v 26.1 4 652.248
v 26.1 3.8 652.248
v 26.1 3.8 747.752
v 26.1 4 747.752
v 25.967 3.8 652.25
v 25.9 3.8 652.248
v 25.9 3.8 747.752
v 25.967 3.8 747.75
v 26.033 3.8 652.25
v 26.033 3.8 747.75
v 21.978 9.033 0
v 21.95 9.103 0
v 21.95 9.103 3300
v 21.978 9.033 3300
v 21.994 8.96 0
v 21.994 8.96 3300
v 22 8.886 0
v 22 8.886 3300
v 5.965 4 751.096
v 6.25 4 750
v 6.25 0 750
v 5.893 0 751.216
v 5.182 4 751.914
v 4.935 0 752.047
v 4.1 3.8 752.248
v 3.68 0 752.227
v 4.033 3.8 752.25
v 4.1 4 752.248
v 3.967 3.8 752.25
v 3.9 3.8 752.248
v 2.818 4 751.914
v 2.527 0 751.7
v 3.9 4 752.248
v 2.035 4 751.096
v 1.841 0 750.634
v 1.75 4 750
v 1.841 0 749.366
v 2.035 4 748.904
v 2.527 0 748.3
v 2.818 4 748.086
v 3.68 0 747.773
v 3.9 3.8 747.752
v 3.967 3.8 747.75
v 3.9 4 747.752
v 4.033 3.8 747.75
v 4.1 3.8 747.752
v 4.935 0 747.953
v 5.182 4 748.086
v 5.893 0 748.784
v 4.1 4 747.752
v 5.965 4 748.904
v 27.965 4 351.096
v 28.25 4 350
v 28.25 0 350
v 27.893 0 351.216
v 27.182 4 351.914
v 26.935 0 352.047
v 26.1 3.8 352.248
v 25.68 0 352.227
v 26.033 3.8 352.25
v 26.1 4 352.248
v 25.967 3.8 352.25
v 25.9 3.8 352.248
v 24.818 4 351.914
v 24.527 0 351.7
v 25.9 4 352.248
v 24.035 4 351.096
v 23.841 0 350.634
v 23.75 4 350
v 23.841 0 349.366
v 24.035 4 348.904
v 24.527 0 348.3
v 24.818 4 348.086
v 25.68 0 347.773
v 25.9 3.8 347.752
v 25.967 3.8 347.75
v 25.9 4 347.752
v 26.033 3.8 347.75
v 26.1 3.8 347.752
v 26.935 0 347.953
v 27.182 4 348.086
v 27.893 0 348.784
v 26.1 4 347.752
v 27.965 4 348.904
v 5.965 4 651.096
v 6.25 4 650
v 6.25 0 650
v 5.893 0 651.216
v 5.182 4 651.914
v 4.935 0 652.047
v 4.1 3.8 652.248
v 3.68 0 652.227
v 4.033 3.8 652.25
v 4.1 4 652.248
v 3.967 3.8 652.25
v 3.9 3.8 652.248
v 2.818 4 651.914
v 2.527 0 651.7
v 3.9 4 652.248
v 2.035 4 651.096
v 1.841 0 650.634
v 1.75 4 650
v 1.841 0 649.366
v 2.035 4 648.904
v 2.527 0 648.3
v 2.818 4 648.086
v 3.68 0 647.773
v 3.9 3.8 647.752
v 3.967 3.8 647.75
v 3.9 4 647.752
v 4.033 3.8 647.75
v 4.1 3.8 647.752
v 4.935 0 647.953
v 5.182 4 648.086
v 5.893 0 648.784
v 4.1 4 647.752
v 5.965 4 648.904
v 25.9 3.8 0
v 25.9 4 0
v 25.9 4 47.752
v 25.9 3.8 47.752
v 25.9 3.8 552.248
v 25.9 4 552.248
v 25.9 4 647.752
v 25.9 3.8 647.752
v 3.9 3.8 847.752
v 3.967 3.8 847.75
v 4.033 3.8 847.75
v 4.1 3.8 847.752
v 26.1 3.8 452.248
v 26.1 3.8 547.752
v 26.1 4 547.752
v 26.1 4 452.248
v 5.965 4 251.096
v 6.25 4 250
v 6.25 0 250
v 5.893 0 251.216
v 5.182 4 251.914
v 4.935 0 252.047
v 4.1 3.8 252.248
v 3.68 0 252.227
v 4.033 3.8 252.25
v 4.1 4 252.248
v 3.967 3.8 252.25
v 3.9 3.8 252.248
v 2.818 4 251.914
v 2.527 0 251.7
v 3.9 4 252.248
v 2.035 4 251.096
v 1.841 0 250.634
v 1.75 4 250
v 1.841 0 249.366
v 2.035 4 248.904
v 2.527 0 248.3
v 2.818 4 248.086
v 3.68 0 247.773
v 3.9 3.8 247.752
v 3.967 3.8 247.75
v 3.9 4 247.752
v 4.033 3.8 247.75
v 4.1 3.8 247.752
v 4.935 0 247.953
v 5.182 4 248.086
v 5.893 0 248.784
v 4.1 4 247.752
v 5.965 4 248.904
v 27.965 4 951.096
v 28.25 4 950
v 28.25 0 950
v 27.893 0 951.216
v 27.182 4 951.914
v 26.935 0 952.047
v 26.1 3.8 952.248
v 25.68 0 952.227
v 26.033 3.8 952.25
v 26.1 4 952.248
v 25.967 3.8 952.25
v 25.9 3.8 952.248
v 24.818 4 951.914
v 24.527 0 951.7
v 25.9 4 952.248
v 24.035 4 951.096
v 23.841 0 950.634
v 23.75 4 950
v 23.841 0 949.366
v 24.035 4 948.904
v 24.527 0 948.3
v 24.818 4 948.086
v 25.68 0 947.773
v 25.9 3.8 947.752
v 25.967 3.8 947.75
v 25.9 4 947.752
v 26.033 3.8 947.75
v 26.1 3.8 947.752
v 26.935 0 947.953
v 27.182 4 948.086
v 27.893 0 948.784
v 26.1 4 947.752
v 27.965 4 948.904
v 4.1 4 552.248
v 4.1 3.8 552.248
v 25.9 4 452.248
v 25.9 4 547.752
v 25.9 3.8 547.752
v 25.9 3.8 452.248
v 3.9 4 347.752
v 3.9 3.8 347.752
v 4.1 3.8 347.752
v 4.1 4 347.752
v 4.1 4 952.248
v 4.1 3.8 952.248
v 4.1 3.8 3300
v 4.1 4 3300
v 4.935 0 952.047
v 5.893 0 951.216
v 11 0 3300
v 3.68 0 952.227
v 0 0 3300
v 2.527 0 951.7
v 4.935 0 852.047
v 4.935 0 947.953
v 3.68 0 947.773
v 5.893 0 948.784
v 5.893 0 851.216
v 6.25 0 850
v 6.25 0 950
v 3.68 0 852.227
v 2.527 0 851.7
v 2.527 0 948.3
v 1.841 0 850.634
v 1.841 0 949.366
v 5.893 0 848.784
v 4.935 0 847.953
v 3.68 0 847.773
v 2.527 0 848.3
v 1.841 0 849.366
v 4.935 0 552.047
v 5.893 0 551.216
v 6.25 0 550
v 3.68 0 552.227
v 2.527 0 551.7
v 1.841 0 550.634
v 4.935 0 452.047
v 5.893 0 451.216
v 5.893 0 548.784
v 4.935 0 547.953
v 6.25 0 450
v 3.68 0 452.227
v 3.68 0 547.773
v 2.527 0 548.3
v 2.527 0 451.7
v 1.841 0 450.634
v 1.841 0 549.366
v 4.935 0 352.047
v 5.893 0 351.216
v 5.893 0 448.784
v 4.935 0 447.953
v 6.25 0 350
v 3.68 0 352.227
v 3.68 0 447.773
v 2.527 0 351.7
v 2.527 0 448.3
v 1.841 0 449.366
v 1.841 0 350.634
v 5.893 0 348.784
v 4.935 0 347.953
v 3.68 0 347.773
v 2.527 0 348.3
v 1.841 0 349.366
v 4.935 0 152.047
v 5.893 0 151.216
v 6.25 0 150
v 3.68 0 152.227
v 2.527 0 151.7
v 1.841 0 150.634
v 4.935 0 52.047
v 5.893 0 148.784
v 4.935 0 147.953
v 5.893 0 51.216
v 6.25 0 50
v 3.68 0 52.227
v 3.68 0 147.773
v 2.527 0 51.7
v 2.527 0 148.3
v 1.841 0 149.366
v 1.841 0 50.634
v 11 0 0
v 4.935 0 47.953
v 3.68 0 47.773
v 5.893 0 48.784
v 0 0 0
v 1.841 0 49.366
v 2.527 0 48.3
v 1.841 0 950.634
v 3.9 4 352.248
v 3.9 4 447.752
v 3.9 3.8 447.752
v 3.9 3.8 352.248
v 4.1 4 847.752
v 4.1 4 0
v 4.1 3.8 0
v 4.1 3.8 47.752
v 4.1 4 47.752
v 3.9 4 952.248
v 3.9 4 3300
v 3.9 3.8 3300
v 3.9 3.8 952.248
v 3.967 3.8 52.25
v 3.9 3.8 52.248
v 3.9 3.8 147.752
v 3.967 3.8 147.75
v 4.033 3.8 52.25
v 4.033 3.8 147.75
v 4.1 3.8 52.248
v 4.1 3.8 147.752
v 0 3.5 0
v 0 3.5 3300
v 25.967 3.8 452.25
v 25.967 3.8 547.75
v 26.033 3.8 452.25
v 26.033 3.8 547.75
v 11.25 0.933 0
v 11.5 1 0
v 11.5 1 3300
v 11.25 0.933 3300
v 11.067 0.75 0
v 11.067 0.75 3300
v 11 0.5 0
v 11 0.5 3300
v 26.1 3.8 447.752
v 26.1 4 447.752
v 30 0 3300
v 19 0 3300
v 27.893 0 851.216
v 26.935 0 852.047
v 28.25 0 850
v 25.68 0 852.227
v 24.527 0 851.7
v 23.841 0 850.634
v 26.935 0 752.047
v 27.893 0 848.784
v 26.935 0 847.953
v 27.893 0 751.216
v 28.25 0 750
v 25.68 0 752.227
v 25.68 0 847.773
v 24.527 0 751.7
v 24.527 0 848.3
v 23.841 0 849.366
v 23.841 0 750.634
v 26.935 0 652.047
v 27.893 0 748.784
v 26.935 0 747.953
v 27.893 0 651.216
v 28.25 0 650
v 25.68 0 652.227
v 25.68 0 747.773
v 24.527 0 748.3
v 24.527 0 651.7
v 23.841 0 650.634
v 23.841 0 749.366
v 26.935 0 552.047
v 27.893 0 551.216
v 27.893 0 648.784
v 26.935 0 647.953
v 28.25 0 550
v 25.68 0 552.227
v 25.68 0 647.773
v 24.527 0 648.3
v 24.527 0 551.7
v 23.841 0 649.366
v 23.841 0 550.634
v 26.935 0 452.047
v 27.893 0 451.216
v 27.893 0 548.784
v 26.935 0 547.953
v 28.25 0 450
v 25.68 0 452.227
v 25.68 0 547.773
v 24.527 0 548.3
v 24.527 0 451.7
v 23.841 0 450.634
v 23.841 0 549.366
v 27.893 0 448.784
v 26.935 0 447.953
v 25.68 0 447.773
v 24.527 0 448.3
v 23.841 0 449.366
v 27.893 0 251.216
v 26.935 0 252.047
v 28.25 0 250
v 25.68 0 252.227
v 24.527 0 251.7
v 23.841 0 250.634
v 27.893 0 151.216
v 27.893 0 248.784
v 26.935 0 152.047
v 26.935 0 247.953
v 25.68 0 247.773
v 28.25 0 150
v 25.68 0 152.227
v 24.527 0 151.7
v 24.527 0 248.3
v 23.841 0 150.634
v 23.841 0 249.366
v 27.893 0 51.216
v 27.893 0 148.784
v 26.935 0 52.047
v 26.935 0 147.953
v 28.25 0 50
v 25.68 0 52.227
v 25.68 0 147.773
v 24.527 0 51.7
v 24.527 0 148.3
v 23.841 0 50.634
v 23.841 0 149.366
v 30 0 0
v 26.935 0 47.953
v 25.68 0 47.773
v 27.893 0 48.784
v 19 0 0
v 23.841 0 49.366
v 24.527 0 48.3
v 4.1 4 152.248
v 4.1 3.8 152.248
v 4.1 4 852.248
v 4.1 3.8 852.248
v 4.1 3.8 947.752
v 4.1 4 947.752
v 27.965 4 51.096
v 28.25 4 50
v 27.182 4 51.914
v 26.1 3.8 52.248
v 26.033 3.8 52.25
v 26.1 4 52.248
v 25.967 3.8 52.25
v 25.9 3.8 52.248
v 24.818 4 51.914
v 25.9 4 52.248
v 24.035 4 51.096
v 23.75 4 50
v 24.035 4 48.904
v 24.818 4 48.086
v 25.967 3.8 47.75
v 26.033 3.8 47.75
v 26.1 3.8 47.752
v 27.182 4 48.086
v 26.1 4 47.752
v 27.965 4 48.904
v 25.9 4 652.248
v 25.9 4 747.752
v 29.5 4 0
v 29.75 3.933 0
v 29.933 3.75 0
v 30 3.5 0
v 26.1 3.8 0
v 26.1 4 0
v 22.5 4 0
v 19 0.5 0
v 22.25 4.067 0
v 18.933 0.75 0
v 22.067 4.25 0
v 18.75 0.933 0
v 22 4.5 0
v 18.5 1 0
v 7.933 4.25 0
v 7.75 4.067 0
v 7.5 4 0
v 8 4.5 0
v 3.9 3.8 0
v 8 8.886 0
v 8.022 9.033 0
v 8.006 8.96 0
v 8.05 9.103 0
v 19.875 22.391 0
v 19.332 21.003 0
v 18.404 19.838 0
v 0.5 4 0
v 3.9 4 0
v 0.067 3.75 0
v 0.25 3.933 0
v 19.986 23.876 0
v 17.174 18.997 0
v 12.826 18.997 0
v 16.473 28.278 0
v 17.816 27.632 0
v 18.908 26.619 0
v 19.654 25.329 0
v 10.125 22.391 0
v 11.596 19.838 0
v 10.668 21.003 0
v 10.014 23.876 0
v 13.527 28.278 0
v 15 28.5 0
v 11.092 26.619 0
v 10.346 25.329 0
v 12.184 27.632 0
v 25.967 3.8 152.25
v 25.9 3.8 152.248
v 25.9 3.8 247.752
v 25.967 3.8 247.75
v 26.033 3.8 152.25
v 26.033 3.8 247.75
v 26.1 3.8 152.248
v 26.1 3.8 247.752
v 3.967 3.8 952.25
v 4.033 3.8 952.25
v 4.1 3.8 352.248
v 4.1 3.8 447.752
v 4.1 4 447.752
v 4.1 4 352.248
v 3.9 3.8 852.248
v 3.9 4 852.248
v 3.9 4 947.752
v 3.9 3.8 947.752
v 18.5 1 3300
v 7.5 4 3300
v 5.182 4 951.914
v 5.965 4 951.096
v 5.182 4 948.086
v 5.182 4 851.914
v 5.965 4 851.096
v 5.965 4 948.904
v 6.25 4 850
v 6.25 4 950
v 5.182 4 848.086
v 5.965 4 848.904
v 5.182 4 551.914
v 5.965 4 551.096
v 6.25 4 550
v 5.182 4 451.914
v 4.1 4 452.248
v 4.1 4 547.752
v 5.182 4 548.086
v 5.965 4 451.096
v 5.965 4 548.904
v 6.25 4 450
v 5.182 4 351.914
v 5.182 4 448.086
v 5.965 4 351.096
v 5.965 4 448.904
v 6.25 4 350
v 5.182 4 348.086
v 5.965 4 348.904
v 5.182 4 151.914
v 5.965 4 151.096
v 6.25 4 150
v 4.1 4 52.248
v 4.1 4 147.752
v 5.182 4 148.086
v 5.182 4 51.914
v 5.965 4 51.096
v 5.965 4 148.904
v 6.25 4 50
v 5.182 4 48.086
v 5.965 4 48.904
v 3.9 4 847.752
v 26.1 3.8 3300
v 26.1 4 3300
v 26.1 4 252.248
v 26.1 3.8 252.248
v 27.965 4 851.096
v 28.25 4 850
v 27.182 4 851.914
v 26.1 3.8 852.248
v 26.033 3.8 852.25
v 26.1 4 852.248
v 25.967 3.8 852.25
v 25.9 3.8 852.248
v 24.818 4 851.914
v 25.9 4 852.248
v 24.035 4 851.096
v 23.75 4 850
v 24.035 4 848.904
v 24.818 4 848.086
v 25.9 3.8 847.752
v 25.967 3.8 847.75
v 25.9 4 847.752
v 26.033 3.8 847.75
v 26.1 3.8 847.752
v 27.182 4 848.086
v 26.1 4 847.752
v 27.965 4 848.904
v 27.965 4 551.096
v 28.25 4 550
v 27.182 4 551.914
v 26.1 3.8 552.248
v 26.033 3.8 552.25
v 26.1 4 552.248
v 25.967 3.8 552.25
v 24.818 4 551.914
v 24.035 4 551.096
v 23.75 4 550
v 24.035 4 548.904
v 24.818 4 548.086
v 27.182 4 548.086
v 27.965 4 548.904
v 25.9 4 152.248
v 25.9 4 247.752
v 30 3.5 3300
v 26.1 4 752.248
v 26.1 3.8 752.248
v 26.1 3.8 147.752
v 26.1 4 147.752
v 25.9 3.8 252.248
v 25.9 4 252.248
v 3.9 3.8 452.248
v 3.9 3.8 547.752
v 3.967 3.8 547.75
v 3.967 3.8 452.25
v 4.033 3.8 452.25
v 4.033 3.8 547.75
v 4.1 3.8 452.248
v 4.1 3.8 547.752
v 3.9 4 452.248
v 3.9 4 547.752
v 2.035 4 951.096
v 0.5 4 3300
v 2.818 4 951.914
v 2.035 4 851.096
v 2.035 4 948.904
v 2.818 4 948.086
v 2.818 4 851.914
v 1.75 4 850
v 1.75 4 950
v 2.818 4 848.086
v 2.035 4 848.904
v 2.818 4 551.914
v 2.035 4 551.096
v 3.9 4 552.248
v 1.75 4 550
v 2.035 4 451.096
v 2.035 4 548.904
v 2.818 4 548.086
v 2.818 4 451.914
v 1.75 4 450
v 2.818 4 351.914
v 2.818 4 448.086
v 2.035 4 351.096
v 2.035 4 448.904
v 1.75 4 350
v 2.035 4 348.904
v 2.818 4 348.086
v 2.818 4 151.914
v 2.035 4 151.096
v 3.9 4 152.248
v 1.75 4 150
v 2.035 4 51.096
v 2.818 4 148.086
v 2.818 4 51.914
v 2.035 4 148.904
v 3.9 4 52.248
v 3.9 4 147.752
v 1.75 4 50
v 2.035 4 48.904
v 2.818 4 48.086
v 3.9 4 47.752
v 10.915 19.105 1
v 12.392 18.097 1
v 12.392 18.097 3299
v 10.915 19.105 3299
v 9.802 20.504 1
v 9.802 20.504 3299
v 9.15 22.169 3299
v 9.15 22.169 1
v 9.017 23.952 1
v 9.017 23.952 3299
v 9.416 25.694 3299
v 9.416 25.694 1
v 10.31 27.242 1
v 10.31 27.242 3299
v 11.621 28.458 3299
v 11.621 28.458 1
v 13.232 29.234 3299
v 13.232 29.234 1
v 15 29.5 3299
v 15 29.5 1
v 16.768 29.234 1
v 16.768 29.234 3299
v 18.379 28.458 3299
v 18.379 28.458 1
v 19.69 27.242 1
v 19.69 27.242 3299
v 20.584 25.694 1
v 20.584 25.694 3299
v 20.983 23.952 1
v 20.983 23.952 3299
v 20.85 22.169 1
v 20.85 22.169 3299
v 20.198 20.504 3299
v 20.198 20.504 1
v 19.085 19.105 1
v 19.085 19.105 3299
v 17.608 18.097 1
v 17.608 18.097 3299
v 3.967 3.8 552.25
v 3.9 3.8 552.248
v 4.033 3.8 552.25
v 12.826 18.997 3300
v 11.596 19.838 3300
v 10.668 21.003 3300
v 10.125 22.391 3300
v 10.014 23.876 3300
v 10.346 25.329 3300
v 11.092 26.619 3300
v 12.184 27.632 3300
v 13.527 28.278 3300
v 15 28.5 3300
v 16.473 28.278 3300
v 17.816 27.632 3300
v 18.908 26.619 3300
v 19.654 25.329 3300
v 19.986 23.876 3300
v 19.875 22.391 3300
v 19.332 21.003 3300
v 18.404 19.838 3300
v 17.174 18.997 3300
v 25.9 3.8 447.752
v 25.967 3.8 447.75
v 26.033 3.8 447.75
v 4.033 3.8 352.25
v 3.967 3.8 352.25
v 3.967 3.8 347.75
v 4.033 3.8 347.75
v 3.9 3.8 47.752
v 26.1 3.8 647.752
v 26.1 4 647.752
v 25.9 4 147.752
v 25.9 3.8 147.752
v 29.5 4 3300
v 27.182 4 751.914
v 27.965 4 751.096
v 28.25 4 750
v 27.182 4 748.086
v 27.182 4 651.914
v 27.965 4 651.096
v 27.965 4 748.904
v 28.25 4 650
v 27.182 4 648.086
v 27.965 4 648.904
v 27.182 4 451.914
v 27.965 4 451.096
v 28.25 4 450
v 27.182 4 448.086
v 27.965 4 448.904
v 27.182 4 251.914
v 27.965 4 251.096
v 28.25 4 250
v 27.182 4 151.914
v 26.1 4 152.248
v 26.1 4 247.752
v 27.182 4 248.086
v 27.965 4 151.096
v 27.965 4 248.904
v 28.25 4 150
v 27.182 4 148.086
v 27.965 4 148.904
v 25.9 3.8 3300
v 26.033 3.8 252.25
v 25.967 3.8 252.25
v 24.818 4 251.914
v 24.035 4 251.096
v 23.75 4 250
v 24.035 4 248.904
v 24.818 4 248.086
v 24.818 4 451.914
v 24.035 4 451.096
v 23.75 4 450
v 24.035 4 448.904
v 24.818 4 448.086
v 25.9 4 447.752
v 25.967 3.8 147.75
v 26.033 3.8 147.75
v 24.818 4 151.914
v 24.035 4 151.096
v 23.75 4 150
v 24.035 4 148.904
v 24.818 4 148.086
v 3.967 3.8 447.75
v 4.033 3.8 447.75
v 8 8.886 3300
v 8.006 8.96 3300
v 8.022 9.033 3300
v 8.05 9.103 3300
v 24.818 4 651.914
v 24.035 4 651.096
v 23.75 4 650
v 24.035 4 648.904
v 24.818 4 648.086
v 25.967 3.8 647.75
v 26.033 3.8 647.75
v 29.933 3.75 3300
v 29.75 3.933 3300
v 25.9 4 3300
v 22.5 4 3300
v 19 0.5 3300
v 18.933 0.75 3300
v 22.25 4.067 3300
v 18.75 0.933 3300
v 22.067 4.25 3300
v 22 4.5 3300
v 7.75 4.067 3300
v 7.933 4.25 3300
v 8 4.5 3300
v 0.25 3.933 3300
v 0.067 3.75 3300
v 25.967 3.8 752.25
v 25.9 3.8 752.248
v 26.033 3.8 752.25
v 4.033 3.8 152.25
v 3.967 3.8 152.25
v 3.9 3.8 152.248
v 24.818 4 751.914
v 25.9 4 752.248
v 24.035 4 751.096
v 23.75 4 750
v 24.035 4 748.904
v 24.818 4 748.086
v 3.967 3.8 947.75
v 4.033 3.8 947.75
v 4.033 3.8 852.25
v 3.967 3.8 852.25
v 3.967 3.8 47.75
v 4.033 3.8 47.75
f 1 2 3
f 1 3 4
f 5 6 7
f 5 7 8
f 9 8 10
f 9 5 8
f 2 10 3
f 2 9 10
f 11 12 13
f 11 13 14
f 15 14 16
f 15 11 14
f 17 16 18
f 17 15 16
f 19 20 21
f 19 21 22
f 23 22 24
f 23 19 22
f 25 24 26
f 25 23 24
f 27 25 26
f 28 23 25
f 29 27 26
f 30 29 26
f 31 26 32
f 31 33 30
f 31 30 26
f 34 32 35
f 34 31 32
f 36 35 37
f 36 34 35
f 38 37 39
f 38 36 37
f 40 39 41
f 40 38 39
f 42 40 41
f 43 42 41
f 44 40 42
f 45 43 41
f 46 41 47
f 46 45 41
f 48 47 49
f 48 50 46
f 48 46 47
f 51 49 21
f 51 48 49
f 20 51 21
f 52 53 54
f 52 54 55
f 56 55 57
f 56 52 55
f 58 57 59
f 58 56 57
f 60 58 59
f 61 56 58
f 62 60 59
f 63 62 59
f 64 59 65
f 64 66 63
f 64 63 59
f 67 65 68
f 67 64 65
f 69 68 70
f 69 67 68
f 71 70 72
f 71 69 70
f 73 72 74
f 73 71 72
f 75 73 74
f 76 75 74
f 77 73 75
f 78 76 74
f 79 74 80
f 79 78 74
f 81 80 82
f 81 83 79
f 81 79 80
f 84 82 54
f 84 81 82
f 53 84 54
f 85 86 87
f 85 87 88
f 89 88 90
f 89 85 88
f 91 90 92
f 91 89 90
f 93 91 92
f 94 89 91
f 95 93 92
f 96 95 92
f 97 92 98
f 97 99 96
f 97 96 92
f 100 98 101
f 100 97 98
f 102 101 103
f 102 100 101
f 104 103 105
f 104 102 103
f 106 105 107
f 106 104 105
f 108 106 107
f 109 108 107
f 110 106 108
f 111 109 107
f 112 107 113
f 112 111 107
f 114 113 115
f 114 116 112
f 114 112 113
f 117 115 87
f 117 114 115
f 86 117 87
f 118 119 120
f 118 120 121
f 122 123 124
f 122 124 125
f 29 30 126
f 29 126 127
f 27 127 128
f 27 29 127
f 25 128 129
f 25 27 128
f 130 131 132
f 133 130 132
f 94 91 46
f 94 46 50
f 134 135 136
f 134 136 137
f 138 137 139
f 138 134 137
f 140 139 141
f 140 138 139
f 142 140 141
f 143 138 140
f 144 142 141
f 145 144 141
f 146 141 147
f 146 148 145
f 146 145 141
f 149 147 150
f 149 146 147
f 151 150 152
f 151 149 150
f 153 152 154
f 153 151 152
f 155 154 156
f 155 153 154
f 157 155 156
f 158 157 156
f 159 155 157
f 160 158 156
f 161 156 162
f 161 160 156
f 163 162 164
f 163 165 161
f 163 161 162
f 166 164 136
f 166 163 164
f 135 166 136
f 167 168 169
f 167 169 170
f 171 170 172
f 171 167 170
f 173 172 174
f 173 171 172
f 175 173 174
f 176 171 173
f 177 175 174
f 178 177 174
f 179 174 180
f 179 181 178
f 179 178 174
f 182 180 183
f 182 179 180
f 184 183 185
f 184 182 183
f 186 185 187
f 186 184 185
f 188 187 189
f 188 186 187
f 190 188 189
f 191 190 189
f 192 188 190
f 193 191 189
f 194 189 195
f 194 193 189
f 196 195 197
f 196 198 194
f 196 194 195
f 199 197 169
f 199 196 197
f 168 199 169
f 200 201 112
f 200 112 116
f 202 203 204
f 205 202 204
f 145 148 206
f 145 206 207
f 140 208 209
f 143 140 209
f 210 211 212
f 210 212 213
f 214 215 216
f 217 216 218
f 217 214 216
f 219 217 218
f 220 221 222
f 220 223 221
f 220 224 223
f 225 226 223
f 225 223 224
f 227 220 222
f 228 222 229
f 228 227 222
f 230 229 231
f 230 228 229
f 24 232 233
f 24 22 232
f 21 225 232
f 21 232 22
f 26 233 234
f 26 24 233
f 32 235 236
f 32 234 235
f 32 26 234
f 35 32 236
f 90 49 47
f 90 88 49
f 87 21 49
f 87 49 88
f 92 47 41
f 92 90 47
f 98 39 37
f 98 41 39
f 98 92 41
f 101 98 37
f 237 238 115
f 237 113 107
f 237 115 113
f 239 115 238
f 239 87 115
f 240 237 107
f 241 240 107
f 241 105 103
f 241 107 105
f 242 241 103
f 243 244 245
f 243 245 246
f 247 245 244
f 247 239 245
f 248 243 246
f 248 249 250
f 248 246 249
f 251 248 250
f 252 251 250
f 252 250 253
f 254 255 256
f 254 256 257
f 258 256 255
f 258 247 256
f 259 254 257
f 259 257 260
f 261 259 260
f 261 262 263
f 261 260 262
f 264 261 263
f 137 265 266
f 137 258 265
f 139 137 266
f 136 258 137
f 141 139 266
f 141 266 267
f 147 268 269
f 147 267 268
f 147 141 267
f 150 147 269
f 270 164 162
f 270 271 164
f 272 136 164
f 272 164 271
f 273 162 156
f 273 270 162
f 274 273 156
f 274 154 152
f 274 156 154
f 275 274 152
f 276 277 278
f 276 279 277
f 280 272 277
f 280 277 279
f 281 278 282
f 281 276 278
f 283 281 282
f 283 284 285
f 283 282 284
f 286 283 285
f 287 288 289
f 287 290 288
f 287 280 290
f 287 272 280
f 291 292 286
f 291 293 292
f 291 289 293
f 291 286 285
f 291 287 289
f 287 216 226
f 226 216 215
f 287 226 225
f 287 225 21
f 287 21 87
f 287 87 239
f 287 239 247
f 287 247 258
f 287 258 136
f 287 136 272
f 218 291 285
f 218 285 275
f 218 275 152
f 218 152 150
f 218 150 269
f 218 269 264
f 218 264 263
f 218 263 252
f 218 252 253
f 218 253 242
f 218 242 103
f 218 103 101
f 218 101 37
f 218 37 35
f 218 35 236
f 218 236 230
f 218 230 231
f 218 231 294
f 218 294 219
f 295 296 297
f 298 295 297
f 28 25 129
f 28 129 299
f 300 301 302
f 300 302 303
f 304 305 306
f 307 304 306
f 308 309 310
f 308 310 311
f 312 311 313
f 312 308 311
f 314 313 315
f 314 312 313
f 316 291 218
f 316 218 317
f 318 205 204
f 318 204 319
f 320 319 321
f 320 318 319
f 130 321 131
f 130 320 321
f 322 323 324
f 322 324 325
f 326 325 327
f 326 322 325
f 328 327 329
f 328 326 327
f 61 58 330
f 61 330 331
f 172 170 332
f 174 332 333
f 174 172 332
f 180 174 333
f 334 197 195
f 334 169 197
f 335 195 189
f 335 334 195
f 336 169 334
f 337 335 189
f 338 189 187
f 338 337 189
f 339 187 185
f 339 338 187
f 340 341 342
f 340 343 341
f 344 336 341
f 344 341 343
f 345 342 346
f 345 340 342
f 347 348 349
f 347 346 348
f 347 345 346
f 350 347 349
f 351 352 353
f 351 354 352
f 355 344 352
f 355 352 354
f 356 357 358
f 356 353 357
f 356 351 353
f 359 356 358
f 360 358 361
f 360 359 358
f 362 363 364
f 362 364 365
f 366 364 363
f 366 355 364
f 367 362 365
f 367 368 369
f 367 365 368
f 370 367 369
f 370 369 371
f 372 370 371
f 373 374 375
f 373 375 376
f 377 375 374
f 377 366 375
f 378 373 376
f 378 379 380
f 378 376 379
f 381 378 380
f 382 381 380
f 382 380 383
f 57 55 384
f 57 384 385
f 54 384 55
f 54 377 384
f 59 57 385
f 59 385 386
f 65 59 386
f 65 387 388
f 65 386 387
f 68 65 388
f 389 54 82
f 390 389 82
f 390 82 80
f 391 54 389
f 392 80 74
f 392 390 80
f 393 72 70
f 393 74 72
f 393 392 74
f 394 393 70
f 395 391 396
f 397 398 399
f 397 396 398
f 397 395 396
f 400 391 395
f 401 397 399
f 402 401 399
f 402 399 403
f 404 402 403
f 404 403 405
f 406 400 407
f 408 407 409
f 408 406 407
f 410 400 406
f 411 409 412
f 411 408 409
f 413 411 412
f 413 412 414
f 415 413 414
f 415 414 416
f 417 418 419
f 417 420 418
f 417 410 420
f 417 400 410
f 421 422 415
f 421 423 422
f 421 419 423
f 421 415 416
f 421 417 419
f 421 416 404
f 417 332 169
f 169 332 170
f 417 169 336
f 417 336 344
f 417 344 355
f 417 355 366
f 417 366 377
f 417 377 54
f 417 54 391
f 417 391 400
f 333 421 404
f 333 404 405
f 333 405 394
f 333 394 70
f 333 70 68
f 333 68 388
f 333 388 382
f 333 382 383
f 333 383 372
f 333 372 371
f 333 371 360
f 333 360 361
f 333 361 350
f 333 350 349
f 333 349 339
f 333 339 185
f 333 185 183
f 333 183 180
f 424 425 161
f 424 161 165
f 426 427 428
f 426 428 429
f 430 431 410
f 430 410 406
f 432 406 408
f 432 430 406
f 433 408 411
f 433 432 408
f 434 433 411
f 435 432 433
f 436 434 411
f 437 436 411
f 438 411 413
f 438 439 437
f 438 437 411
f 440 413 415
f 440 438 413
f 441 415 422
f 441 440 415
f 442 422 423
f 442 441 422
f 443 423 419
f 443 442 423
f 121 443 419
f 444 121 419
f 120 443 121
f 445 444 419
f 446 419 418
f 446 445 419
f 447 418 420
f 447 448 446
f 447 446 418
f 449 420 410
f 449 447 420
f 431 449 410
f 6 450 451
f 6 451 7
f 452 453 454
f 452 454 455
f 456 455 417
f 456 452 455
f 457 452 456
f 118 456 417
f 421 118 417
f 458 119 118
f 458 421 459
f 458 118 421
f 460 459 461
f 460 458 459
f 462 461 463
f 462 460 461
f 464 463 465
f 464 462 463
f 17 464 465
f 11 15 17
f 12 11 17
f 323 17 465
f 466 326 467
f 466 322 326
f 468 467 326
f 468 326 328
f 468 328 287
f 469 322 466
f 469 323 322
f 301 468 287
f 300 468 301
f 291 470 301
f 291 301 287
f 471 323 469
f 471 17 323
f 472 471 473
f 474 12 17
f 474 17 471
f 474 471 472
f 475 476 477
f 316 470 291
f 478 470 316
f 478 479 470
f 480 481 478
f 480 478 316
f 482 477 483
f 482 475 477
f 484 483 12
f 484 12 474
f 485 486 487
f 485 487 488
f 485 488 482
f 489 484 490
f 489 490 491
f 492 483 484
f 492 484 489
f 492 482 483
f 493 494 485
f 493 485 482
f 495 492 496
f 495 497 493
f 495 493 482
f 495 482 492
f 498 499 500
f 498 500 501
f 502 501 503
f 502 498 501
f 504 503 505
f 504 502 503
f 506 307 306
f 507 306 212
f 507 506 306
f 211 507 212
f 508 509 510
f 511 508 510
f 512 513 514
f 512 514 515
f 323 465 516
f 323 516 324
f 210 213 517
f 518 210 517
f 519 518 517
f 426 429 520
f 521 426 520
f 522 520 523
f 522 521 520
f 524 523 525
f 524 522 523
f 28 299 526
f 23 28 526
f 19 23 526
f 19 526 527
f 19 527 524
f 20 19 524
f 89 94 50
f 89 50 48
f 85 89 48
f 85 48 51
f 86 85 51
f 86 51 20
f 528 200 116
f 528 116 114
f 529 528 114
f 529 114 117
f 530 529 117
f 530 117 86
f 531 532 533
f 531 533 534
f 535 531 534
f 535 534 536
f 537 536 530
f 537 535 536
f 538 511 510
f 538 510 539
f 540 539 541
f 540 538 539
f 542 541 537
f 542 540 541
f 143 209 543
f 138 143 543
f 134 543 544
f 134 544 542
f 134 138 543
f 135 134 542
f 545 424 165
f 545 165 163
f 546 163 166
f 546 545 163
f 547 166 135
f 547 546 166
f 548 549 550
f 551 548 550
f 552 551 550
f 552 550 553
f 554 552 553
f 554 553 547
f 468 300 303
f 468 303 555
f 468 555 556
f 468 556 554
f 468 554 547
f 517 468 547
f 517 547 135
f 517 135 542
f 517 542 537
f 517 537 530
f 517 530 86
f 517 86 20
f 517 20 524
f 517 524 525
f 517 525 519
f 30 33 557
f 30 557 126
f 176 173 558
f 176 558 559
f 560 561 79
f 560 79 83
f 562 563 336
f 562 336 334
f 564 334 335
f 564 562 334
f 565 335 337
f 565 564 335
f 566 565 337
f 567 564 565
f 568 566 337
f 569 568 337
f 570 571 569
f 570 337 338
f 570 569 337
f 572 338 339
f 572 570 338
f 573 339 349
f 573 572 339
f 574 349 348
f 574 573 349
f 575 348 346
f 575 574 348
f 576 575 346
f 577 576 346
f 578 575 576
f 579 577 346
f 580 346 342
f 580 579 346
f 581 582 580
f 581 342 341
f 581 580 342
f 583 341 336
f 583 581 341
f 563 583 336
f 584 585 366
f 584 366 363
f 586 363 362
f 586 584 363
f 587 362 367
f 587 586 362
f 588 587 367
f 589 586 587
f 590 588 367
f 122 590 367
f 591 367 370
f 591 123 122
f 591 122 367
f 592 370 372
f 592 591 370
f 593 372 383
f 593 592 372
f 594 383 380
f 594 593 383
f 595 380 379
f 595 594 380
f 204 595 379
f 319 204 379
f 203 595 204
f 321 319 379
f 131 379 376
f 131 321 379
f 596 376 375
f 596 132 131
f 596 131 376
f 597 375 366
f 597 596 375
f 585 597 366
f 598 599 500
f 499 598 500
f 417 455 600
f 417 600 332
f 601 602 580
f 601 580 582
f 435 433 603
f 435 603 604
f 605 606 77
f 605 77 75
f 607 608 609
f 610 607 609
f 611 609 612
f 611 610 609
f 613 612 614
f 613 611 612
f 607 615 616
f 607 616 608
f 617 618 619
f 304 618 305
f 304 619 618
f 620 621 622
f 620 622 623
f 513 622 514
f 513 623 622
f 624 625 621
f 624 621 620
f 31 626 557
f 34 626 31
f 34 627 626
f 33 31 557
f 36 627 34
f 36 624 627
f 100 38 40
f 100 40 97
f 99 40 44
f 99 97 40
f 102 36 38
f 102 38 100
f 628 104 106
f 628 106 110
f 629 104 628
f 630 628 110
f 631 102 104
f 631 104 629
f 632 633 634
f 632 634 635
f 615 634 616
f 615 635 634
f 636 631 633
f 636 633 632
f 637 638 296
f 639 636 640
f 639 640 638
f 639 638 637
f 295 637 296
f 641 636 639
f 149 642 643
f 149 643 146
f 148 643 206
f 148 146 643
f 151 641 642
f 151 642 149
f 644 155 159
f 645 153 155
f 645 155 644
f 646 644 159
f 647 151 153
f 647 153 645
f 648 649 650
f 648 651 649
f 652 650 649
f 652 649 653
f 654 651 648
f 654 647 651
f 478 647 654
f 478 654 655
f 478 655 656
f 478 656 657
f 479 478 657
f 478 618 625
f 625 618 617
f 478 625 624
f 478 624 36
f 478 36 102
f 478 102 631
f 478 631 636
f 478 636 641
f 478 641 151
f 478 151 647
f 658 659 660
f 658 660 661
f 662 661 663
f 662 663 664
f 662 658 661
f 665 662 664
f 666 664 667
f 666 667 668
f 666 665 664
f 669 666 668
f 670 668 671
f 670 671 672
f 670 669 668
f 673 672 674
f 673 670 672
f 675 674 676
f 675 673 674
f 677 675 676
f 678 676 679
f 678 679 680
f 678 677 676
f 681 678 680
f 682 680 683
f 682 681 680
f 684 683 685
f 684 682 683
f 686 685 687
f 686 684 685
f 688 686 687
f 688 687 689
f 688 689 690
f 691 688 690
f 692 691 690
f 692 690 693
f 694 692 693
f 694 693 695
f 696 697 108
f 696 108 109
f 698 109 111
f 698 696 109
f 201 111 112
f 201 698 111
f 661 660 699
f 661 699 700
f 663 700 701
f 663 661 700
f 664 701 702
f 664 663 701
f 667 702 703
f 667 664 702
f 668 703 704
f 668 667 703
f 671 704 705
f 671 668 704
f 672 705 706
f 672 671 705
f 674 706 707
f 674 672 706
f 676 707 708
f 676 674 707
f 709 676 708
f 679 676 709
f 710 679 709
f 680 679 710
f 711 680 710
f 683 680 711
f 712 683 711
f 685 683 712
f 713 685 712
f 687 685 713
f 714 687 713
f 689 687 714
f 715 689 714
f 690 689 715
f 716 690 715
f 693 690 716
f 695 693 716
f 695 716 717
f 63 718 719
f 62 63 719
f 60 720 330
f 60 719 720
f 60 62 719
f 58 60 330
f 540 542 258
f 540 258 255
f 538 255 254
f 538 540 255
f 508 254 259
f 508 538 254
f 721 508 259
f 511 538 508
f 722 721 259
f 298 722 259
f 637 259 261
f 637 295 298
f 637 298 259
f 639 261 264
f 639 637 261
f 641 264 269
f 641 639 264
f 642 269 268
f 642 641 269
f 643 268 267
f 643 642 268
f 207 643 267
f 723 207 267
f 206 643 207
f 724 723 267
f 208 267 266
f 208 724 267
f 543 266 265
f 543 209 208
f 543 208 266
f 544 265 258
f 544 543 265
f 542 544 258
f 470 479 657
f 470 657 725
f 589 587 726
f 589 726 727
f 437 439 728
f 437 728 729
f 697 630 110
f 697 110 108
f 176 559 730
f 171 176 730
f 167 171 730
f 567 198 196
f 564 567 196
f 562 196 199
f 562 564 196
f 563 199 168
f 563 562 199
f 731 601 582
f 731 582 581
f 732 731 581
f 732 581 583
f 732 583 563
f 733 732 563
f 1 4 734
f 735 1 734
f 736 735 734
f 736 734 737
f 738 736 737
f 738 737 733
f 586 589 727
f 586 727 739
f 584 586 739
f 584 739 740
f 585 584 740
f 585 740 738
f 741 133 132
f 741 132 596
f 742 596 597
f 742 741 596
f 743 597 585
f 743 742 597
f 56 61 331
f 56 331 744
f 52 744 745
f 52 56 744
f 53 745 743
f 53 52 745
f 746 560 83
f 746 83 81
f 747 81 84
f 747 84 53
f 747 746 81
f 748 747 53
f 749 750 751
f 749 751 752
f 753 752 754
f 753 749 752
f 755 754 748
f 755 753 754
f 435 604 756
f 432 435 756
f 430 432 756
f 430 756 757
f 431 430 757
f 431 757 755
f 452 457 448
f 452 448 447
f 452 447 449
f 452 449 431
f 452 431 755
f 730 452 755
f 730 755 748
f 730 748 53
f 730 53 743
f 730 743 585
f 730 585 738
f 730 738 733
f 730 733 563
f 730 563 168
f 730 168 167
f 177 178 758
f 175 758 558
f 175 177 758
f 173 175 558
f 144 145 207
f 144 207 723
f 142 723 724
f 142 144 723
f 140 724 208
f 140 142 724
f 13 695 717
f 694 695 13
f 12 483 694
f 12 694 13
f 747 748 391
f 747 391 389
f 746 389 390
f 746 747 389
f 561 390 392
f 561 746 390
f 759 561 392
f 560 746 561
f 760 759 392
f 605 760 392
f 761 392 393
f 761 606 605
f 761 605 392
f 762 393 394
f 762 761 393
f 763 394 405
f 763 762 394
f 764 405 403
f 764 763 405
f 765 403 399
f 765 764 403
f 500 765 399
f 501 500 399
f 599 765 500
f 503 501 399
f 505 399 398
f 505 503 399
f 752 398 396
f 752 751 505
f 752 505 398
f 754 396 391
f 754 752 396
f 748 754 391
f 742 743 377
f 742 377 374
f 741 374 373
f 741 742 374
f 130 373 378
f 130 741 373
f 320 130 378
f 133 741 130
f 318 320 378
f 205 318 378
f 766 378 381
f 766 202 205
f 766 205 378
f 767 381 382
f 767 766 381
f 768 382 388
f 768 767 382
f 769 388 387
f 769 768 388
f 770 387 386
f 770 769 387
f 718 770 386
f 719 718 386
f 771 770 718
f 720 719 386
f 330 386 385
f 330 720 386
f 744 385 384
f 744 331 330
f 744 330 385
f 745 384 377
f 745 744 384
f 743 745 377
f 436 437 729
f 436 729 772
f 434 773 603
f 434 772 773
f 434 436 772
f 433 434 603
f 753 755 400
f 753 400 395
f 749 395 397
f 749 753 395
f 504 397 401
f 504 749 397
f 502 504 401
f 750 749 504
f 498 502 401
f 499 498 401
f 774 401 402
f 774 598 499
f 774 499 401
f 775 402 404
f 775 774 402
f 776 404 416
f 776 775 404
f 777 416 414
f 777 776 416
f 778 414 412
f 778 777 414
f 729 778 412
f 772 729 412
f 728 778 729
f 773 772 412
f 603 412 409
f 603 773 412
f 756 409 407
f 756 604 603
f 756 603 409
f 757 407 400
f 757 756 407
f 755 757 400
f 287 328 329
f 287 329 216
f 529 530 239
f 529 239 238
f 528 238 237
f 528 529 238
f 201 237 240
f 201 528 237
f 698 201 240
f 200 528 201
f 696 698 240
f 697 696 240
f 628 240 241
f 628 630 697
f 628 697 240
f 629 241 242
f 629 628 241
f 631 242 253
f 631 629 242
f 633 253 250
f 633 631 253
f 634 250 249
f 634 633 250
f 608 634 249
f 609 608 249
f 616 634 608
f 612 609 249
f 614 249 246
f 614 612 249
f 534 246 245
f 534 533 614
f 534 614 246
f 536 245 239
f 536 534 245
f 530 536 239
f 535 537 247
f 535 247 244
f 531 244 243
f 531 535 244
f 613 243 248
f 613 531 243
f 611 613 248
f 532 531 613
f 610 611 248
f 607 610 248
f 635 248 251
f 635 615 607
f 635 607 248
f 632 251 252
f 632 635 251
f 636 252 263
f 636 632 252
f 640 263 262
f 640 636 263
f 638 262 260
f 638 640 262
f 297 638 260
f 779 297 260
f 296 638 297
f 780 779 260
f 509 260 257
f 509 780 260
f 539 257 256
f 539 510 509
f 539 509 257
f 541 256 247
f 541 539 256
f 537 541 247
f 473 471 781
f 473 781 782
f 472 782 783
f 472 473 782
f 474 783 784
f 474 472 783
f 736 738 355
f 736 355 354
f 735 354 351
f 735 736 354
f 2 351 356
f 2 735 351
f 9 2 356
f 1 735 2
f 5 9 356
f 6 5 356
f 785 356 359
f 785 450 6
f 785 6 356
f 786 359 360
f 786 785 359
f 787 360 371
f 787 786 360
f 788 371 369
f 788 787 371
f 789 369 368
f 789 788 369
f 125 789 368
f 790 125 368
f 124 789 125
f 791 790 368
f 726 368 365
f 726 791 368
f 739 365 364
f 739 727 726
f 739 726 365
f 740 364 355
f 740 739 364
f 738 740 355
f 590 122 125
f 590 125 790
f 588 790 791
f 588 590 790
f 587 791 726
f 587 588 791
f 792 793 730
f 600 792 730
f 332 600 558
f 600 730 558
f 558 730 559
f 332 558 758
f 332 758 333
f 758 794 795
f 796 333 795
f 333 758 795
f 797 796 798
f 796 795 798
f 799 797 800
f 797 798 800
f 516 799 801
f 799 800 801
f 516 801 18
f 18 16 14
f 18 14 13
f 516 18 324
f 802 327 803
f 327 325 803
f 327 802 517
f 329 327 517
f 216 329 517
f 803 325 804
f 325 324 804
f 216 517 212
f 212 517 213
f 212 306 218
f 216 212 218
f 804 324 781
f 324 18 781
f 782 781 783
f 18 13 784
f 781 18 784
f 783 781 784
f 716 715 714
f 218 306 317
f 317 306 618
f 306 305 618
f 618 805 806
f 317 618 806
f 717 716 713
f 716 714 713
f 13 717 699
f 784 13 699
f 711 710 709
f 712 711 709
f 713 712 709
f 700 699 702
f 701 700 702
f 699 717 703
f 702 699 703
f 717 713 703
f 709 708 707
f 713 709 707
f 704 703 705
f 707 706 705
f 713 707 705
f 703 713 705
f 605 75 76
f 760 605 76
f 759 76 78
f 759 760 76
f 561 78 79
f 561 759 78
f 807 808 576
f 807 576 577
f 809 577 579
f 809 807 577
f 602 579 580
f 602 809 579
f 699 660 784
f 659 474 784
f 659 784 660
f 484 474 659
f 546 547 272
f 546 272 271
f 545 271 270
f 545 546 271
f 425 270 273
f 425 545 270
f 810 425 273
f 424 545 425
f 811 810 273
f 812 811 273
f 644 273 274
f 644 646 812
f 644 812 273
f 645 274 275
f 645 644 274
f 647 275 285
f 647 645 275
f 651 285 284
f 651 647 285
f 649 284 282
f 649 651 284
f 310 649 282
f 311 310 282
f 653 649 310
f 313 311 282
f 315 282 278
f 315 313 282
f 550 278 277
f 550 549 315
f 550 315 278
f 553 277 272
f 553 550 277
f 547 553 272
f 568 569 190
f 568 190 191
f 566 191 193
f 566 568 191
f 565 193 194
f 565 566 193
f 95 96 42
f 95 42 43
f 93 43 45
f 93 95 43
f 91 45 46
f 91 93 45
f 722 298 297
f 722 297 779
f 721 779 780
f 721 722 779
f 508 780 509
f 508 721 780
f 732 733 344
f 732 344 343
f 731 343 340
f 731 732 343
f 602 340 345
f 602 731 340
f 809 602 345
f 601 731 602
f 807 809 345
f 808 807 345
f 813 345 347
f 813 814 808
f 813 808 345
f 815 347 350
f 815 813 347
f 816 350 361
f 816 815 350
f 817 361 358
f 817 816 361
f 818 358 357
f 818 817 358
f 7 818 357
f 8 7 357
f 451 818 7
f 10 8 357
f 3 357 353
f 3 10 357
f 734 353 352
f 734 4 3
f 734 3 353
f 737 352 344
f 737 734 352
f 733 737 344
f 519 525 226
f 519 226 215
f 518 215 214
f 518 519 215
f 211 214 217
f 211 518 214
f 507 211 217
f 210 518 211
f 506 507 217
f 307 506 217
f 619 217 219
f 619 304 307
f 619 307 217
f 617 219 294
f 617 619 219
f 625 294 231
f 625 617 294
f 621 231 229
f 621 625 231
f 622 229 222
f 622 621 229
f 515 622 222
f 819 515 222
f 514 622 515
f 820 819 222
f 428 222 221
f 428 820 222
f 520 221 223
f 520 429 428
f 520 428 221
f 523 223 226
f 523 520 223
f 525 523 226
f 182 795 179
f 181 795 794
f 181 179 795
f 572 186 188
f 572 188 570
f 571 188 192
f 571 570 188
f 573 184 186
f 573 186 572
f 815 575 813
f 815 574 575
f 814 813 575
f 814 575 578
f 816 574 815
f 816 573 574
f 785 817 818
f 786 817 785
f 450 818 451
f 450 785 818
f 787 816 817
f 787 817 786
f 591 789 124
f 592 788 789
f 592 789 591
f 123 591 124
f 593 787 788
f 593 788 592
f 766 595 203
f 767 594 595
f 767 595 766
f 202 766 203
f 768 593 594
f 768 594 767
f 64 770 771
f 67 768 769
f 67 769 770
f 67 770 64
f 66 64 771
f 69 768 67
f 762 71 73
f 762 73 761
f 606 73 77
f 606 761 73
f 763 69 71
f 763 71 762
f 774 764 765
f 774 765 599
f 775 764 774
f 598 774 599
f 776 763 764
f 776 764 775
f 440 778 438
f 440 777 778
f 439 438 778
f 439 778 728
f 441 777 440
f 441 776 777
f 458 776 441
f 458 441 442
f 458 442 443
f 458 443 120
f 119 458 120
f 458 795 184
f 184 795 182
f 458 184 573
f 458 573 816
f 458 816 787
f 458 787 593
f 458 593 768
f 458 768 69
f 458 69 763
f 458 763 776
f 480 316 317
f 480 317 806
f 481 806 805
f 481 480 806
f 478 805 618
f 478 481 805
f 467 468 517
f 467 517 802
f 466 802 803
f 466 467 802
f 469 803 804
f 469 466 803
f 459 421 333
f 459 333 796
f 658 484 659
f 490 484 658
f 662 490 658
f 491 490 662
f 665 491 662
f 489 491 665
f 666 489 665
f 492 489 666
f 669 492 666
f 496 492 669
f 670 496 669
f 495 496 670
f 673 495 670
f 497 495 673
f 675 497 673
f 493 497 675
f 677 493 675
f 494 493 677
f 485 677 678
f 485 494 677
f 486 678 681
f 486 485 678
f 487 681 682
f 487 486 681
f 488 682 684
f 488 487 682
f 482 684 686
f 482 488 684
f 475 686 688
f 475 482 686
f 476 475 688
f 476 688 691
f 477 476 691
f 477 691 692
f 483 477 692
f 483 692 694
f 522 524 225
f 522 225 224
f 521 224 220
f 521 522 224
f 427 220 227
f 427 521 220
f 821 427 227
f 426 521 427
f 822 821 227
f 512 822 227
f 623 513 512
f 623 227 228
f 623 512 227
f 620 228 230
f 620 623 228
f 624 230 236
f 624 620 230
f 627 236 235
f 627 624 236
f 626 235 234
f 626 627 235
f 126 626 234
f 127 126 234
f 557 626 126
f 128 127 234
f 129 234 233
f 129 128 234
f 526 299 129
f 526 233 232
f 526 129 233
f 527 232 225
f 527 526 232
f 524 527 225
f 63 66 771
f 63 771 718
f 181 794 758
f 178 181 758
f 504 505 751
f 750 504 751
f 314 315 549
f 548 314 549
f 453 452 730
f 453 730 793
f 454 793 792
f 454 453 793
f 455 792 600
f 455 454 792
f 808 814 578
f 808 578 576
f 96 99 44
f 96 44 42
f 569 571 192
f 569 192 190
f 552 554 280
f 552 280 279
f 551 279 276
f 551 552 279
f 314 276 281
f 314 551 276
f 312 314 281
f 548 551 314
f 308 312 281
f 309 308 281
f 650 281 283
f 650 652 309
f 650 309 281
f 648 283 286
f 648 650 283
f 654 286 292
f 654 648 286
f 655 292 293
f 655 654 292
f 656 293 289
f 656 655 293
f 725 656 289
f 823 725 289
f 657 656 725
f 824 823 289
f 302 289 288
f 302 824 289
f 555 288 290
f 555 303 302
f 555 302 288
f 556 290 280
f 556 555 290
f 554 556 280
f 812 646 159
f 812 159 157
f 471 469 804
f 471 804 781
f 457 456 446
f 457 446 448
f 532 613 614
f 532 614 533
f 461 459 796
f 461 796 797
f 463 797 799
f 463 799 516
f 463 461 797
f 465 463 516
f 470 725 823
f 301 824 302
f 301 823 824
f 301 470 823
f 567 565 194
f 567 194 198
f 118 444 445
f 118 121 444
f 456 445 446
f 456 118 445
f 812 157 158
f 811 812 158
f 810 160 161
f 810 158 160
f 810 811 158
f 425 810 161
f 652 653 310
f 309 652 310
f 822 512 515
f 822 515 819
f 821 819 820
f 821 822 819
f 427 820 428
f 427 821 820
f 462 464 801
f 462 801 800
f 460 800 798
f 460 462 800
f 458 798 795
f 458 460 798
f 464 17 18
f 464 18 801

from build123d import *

# Parameters (mm, degrees)
BOSS_EXTRU_1_DEPTH         = 3300
CHANFREIN5_SIZE            = 1
CHANFREIN6_SIZE            = 1
ENL_V_START                = -4
ESQUISSE2_R                = 2.25
ENL_V_MAT_EXTRU_1_DEPTH    = 4
R_P_TITION_LIN_AIRE1_COUNT = 9
R_P_TITION_LIN_AIRE1_PITCH = 100


with BuildPart() as part:
    # Esquisse1 → Boss.-Extru.1 (new body)
    with BuildSketch(Plane.XY):
        with BuildLine():
            Line((0, 0), (0, 3.5))
            ThreePointArc((0, 3.5), (0.146446609, 3.853553391), (0.5, 4))
            Line((0.5, 4), (3.9, 4))
            Line((3.9, 4), (3.9, 3.8))
            Line((3.9, 3.8), (4.1, 3.8))
            Line((4.1, 3.8), (4.1, 4))
            Line((4.1, 4), (7.5, 4))
            ThreePointArc((7.5, 4), (7.853553391, 4.146446609), (8, 4.5))
            Line((8, 4.5), (8, 8.885625558))
            ThreePointArc((8, 8.885625558), (8.012589542, 8.997120156), (8.049724182, 9.103000091))
            Line((8.049724182, 9.103000091), (12.391505605, 18.096690182))
            ThreePointArc((12.391505605, 18.096690182), (15, 29.5), (17.608494395, 18.096690182))
            Line((17.608494395, 18.096690182), (21.950275818, 9.103000091))
            ThreePointArc((21.950275818, 9.103000091), (21.987410458, 8.997120156), (22, 8.885625558))
            Line((22, 8.885625558), (22, 4.5))
            ThreePointArc((22, 4.5), (22.146446609, 4.146446609), (22.5, 4))
            Line((22.5, 4), (25.9, 4))
            Line((25.9, 4), (25.9, 3.8))
            Line((25.9, 3.8), (26.1, 3.8))
            Line((26.1, 3.8), (26.1, 4))
            Line((26.1, 4), (29.5, 4))
            ThreePointArc((29.5, 4), (29.853553391, 3.853553391), (30, 3.5))
            Line((30, 3.5), (30, 0))
            Line((30, 0), (19, 0))
            Line((19, 0), (19, 0.5))
            ThreePointArc((19, 0.5), (18.853553391, 0.853553391), (18.5, 1))
            Line((18.5, 1), (11.5, 1))
            ThreePointArc((11.5, 1), (11.146446609, 0.853553391), (11, 0.5))
            Line((11, 0.5), (11, 0))
            Line((11, 0), (0, 0))
        make_face()
    extrude(amount=BOSS_EXTRU_1_DEPTH)

    # Chanfrein5
    chanfrein5_edges = [part.edges().sort_by_distance(p)[0] for p in [
        (15, 29.5, 0),
    ]]
    chamfer(chanfrein5_edges, length=CHANFREIN5_SIZE)

    # Chanfrein6
    chanfrein6_edges = [part.edges().sort_by_distance(p)[0] for p in [
        (15, 29.5, 3300),
    ]]
    chamfer(chanfrein6_edges, length=CHANFREIN6_SIZE)

    # Esquisse2 → Enlèv. mat.-Extru.1 (cut)
    with BuildSketch(Plane.XZ.offset(ENL_V_START)):
        with Locations((4, 850)):
            Circle(ESQUISSE2_R)
        with Locations((26, 850)):
            Circle(ESQUISSE2_R)
        with Locations((26, 950)):
            Circle(ESQUISSE2_R)
        with Locations((4, 950)):
            Circle(ESQUISSE2_R)
    enl_v_mat_extru_1 = extrude(amount=ENL_V_MAT_EXTRU_1_DEPTH, mode=Mode.SUBTRACT)

    # Répétition linéaire1: Enlèv. mat.-Extru.1 ×9
    with Locations(*[(0, 0, -i * R_P_TITION_LIN_AIRE1_PITCH) for i in range(1, R_P_TITION_LIN_AIRE1_COUNT)]):
        add(enl_v_mat_extru_1, mode=Mode.SUBTRACT)


solid = part.part
